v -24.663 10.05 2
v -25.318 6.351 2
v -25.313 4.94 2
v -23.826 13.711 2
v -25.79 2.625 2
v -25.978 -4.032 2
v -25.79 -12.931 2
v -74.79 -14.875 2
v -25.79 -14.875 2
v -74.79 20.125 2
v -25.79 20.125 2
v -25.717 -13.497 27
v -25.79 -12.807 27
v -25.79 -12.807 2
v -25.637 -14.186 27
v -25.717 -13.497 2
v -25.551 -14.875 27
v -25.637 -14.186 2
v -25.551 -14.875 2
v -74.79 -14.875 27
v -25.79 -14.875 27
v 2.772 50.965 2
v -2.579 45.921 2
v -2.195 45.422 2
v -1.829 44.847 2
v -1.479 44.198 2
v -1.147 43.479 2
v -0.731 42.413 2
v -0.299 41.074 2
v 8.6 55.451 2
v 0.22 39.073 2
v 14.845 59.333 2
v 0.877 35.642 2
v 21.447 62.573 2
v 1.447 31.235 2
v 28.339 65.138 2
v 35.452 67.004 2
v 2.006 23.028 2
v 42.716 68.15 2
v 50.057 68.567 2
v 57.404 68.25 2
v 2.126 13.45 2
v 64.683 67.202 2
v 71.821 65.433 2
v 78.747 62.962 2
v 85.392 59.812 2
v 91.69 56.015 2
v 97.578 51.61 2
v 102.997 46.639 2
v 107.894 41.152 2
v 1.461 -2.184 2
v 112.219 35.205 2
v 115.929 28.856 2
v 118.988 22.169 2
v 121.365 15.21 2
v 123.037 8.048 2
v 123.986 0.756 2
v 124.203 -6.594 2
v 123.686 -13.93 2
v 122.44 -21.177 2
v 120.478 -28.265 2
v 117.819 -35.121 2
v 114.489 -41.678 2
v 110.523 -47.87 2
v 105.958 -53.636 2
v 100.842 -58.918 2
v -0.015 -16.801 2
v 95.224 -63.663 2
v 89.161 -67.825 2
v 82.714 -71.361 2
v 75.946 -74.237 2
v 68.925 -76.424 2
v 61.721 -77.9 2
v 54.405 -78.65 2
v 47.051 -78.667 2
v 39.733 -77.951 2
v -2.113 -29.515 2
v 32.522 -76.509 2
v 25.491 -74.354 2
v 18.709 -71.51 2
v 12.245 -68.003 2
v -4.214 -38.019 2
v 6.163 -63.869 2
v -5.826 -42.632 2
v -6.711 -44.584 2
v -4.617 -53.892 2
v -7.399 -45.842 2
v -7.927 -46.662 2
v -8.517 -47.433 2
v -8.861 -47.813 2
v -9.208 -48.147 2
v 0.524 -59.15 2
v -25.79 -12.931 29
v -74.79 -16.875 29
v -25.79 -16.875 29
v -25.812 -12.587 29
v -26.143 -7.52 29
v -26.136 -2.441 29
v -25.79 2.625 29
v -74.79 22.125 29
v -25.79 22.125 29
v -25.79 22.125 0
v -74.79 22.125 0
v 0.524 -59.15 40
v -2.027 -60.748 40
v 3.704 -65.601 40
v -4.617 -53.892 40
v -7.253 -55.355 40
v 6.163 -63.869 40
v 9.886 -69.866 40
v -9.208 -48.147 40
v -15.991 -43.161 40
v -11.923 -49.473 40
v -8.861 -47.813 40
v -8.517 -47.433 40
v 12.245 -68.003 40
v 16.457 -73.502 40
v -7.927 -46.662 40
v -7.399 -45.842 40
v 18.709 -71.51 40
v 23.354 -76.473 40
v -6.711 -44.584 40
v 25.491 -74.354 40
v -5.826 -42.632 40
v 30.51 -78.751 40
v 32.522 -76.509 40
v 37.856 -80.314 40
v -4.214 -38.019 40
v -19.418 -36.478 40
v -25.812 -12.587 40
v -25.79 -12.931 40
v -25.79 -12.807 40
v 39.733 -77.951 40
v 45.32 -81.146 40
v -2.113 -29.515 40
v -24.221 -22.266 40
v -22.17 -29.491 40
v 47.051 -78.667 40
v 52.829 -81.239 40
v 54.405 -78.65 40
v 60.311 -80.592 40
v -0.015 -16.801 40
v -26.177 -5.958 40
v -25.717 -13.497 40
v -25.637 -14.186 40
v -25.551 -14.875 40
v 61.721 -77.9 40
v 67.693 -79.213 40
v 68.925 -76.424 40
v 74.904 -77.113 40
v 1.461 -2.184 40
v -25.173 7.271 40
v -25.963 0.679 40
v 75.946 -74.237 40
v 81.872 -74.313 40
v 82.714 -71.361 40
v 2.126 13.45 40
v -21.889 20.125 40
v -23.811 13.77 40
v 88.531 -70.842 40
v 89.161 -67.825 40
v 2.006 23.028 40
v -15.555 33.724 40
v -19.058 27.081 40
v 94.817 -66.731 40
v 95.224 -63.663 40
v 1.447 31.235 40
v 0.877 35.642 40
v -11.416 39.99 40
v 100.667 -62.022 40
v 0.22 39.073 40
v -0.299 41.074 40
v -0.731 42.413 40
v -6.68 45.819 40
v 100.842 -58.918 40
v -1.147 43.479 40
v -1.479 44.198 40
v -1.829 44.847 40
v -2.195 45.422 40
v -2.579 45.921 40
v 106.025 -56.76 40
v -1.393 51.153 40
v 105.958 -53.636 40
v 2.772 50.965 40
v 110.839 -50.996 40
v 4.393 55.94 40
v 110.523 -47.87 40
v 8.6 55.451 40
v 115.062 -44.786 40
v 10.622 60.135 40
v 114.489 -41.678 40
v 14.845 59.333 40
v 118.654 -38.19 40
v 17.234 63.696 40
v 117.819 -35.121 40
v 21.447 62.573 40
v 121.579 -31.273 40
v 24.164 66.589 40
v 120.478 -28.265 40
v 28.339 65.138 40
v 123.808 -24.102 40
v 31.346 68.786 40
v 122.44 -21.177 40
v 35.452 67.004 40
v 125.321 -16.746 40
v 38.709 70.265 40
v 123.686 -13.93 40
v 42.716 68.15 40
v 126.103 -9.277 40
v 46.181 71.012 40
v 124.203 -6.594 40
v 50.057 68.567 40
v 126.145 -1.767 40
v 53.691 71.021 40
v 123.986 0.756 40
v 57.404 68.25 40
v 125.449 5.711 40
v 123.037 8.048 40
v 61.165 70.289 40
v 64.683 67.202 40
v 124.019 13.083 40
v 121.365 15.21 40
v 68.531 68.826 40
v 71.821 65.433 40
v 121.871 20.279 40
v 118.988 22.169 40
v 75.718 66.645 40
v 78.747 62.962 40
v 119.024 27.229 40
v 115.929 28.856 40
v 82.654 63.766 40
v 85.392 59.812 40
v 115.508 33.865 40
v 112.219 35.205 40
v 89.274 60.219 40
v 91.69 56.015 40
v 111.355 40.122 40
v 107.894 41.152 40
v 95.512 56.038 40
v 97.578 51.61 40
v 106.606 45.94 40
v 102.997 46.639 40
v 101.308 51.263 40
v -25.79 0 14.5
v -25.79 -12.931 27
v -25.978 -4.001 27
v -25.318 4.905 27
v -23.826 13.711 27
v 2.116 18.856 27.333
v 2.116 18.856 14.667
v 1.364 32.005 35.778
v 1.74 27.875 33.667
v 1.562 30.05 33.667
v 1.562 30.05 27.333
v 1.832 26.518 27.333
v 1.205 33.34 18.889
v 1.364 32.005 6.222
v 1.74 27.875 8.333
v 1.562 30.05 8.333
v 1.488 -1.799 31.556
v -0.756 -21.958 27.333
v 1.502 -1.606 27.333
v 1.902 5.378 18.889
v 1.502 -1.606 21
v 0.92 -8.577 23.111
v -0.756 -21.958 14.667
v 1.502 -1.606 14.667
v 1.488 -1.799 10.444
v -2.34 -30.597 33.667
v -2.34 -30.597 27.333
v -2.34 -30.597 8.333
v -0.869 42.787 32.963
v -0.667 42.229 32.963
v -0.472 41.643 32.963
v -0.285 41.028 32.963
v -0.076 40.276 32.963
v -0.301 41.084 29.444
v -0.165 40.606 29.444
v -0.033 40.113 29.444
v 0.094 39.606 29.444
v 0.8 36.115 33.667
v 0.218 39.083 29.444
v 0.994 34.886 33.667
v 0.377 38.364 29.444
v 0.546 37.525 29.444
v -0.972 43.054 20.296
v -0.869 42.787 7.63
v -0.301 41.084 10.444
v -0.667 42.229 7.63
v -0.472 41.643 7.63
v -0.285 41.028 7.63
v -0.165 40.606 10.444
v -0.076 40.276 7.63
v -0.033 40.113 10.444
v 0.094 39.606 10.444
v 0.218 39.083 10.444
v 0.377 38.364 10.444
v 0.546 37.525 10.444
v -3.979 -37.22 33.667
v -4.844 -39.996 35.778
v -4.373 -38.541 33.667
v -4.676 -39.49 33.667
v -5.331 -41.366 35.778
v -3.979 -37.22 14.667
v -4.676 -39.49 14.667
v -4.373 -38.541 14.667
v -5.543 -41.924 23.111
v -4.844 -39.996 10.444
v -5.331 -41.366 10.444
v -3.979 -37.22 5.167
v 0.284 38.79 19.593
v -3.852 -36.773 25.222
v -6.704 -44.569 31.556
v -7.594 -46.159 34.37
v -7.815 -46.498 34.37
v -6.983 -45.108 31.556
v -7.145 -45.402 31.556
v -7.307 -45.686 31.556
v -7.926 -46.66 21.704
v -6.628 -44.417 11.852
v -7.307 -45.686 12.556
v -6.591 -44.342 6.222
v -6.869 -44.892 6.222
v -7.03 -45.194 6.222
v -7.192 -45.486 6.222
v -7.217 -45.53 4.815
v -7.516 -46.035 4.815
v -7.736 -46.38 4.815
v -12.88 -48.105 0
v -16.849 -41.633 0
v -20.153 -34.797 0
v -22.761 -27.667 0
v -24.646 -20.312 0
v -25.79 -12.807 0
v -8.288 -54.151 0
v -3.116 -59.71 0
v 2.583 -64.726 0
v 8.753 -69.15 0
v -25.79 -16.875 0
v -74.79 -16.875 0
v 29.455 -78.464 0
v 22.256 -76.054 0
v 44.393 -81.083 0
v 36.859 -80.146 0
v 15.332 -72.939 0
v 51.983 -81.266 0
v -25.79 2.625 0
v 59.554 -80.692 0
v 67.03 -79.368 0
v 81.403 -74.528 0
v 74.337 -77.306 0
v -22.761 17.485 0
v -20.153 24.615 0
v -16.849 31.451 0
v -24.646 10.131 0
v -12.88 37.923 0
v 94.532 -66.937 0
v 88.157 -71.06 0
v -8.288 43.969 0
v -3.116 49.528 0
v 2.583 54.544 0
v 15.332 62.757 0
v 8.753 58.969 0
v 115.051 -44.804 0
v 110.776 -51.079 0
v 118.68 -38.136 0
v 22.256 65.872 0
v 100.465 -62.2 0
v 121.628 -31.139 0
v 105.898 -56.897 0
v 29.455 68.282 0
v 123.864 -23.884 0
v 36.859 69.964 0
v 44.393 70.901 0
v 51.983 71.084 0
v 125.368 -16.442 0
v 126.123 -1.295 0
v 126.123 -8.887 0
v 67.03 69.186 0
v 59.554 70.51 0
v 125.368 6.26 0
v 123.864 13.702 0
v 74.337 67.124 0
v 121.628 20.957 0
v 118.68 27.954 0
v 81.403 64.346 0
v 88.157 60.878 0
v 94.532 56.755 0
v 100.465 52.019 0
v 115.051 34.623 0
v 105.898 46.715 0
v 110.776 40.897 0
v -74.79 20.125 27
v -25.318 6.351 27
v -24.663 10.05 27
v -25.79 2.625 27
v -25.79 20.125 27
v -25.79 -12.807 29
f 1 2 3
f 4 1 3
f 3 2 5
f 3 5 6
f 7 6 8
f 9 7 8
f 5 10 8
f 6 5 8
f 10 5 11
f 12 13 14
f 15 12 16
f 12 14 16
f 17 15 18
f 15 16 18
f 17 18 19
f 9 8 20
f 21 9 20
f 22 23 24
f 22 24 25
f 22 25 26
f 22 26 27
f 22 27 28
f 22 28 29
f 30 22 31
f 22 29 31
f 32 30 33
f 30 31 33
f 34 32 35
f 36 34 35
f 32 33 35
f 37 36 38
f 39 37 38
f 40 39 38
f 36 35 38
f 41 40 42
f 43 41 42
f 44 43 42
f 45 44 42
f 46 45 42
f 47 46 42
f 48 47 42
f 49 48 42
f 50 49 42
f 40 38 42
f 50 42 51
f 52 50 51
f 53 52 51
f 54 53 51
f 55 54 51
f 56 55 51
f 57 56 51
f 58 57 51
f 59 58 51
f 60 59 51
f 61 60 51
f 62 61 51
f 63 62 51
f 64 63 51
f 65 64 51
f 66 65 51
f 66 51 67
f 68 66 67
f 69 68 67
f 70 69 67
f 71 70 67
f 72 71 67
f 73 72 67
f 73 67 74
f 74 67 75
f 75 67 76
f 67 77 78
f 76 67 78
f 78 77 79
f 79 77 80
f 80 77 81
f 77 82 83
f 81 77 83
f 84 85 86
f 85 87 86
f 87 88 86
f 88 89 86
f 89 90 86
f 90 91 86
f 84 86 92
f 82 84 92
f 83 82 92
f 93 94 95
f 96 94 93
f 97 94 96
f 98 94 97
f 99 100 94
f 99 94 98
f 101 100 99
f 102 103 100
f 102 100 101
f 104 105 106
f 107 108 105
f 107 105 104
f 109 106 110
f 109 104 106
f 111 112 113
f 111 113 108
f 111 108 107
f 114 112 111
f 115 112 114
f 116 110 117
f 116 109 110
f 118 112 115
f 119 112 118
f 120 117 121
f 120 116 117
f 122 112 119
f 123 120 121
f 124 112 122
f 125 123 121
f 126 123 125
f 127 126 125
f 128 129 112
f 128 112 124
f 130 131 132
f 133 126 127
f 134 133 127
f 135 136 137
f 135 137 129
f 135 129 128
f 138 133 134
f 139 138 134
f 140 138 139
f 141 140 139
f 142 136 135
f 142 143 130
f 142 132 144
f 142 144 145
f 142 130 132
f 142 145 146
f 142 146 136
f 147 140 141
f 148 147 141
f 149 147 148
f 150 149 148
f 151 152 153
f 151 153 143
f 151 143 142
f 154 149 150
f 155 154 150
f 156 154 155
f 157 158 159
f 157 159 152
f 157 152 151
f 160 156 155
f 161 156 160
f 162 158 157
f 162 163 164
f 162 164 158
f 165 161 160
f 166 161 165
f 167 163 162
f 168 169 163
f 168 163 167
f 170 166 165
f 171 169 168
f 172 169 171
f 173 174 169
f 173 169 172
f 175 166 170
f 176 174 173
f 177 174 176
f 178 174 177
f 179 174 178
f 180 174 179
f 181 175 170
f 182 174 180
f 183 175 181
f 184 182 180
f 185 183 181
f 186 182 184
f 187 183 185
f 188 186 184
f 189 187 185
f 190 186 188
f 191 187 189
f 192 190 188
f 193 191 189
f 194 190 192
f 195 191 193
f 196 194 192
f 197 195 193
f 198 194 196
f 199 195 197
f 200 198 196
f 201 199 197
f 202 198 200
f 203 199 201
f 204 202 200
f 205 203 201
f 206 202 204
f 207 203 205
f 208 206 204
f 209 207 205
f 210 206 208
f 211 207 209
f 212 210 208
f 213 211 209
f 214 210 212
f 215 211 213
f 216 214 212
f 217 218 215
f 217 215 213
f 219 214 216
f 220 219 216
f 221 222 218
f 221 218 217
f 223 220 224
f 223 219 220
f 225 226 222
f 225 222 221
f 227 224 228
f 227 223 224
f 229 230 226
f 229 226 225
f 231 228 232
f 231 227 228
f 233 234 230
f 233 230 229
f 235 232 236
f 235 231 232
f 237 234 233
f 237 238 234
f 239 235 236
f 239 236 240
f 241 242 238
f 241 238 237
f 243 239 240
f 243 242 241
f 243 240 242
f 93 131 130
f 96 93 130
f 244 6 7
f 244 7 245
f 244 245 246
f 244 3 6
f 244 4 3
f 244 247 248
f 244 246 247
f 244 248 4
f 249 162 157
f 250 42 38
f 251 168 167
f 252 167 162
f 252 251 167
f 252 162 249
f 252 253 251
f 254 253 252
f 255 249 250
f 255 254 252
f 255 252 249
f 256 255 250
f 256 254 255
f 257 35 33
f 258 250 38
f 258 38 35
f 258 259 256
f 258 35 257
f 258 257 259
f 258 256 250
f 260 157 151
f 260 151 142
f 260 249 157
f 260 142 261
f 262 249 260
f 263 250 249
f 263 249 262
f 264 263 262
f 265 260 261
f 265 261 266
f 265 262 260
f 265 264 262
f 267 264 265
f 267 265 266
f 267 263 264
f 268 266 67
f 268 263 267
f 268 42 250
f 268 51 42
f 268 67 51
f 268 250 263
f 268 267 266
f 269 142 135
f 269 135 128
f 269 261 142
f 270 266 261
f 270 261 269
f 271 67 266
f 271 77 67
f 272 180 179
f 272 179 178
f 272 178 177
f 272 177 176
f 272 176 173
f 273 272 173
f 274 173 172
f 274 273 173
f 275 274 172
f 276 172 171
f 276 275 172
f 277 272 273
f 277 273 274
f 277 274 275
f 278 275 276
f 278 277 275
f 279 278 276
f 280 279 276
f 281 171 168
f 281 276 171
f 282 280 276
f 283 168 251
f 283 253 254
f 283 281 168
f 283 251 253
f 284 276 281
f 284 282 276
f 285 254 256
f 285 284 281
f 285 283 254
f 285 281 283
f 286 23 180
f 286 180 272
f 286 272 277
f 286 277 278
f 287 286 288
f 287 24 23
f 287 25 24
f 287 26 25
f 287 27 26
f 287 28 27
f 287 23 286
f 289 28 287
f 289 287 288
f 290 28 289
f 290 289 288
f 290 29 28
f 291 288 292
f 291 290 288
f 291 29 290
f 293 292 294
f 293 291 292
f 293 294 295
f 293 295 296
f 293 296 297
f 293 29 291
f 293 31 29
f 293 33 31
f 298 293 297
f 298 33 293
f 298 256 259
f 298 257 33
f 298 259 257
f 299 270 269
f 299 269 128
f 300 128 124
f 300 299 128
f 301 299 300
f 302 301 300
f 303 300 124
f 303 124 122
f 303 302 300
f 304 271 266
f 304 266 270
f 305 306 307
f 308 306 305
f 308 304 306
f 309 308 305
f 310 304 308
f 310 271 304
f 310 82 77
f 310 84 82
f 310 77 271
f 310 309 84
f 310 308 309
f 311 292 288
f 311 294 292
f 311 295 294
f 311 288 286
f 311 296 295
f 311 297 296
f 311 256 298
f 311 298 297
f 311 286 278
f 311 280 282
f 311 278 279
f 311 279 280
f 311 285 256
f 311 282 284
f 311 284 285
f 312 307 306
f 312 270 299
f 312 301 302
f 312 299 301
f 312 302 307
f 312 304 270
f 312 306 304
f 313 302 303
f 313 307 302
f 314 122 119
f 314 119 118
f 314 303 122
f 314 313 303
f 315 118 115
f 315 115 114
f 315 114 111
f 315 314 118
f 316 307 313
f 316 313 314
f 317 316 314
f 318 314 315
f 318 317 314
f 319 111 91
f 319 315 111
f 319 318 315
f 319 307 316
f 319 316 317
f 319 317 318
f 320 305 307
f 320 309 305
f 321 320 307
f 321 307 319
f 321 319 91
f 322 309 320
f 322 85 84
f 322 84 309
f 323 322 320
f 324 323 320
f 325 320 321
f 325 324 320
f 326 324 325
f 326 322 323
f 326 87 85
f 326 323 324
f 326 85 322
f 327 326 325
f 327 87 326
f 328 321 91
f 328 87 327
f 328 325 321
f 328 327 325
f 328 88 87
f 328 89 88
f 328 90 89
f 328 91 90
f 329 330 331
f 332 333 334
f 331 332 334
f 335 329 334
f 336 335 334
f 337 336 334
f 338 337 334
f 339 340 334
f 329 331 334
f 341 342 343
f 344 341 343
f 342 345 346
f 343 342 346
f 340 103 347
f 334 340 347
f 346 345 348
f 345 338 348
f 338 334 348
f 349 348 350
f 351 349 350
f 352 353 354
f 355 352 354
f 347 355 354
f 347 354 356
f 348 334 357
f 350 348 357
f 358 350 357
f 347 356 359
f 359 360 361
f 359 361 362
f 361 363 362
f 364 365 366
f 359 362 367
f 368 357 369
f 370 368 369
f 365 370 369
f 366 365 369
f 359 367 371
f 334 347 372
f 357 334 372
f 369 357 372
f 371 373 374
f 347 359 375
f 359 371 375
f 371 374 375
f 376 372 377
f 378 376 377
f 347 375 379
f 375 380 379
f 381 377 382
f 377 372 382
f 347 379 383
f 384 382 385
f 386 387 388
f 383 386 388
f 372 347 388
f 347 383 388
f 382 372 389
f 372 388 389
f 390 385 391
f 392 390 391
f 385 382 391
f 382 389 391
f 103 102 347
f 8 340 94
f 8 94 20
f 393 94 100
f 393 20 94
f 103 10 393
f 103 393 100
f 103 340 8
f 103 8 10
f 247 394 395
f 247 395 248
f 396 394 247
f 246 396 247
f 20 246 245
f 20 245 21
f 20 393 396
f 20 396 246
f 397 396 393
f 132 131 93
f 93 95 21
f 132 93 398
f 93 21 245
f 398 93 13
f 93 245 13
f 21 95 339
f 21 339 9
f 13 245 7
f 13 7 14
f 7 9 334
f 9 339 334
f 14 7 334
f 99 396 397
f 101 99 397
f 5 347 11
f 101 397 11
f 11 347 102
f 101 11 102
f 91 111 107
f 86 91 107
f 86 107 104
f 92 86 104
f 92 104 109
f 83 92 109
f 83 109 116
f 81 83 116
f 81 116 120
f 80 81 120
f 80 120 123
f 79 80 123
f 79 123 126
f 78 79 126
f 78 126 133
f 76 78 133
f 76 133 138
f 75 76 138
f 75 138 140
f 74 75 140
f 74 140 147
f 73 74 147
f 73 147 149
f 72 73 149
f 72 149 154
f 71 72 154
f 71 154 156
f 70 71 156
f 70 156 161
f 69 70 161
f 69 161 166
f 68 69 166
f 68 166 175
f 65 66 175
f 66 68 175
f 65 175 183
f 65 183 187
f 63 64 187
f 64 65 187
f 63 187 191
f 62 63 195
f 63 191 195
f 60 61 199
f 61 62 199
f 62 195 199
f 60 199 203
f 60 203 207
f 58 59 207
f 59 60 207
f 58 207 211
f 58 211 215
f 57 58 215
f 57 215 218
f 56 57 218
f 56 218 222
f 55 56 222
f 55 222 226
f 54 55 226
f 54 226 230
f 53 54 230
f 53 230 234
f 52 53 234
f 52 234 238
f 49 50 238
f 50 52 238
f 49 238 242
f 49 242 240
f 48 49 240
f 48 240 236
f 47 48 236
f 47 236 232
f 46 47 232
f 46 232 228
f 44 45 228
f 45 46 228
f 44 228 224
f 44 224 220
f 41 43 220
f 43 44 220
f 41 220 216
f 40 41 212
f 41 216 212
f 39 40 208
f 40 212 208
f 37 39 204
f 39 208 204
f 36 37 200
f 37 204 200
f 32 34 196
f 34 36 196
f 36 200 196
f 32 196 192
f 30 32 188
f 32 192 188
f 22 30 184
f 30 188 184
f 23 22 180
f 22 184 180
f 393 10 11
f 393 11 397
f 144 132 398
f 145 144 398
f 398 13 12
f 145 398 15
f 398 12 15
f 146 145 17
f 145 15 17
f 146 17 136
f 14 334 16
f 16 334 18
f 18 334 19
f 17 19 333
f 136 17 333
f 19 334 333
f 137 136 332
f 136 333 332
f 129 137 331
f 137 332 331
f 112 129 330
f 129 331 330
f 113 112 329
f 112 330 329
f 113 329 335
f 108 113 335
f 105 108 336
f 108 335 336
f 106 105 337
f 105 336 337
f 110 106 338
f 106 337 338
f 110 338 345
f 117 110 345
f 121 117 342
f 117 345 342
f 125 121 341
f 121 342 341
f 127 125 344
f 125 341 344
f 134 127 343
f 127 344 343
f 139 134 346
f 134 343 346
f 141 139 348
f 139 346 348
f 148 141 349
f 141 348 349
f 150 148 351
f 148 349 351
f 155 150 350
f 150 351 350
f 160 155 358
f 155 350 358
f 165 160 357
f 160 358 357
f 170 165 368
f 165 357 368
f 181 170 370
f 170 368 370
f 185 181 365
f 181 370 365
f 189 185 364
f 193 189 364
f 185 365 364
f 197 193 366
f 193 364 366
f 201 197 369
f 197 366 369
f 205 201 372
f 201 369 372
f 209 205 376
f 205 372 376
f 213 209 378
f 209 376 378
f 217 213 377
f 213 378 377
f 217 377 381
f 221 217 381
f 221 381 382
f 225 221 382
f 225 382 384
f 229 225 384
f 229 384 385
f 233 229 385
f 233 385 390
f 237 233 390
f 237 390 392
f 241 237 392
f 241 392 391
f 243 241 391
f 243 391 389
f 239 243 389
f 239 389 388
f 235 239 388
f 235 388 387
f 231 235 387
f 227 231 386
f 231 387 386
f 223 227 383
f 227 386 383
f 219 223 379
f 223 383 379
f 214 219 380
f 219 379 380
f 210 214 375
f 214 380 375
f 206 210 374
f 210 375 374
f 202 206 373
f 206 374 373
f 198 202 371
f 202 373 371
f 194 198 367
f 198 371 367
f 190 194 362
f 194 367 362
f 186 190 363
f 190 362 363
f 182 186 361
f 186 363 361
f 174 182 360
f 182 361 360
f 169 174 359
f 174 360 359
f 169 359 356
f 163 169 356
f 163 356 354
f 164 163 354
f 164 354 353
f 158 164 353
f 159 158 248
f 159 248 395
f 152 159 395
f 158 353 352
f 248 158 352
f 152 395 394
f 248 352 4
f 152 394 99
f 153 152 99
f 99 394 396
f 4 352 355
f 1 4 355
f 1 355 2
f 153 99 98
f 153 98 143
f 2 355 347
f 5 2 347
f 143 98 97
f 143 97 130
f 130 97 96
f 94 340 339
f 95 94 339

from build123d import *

# Parameters (mm, degrees)
F0_W     = 49
F0_H     = 39
F1_DEPTH = 29
F3_R     = 76.2
F4_DEPTH = 40
F5_R     = 73.66
F6_DEPTH = 38
F2_W     = 35
F2_H     = 25
F7_DEPTH = 147.5
F9_DEPTH = 38


with BuildPart() as f1:
    # F0 (on Top) → F1 (new body)
    with BuildSketch(Plane.XY):
        with Locations((-50.2903954238, 2.6249693376)):
            Rectangle(F0_W, F0_H)
    extrude(amount=F1_DEPTH)

    # F3 (on Top) → F4 (join)
    with BuildSketch(Plane.XY):
        with Locations((50.0179536991, -5.090871723)):
            Circle(F3_R)
    extrude(amount=F4_DEPTH)

    # F5 (on face) → F6 (cut)
    with BuildSketch(Plane.XY.offset(40)):
        with Locations((50.5579536991, -5.090871723)):
            Circle(F5_R)
    extrude(amount=-F6_DEPTH, mode=Mode.SUBTRACT)

    # F2 (on face) → F7 (cut)
    with BuildSketch(Plane(origin=(-74.7903954238, 0, 0), x_dir=(0, -1, 0), z_dir=(-1, 0, 0))):
        with Locations((-2.6249693376, 14.5)):
            Rectangle(F2_W, F2_H)
    extrude(amount=-F7_DEPTH, mode=Mode.SUBTRACT)

    # F8 (on face) → F9 (join)
    with BuildSketch(Plane.XY.offset(2)):
        with BuildLine():
            ThreePointArc((-22.4493461678, -14.8750306624), (-17.8813273172, -32.3279863642), (-9.2079011268, -48.147093073))
            add(Edge.make_bspline(
                [(-2.5791042219, 45.9213687248), (6.562867427, 35.1885122385), (1.3712482781, -38.7284297831), (-9.2079011268, -48.147093073)],
                knots=[0.5957171177, 0.5957171177, 0.5957171177, 0.5957171177, 1, 1, 1, 1], degree=3))
            ThreePointArc((-2.5791042219, 45.9213687248), (-11.9603198587, 33.8611637996), (-18.6515612509, 20.1249693376))
            Line((-18.6515612509, 20.1249693376), (-21.8889399872, 20.1249693376))
            ThreePointArc((-21.8889399872, 20.1249693376), (-22.927932873, 16.9395080336), (-23.8258859148, 13.7114513007))
            add(Edge.make_bspline(
                [(-25.7903954238, -12.9307361878), (-26.0689147995, -8.6981558447), (-26.1124652464, 0.3286887969), (-24.7810032726, 9.273748372), (-23.8258859148, 13.7114513007)],
                knots=[0.2496191663, 0.2496191663, 0.2496191663, 0.2496191663, 0.2970853564, 0.3479233847, 0.3479233847, 0.3479233847, 0.3479233847], degree=3))
            Line((-25.7903954238, -12.9307361878), (-25.7903954238, -12.8067127836))
            ThreePointArc((-25.7903954238, -12.8067127836), (-25.6779062067, -13.8416884355), (-25.5512876221, -14.8750306624))
            Line((-25.5512876221, -14.8750306624), (-22.4493461678, -14.8750306624))
        make_face()
    extrude(amount=F9_DEPTH)


solid = f1.part
